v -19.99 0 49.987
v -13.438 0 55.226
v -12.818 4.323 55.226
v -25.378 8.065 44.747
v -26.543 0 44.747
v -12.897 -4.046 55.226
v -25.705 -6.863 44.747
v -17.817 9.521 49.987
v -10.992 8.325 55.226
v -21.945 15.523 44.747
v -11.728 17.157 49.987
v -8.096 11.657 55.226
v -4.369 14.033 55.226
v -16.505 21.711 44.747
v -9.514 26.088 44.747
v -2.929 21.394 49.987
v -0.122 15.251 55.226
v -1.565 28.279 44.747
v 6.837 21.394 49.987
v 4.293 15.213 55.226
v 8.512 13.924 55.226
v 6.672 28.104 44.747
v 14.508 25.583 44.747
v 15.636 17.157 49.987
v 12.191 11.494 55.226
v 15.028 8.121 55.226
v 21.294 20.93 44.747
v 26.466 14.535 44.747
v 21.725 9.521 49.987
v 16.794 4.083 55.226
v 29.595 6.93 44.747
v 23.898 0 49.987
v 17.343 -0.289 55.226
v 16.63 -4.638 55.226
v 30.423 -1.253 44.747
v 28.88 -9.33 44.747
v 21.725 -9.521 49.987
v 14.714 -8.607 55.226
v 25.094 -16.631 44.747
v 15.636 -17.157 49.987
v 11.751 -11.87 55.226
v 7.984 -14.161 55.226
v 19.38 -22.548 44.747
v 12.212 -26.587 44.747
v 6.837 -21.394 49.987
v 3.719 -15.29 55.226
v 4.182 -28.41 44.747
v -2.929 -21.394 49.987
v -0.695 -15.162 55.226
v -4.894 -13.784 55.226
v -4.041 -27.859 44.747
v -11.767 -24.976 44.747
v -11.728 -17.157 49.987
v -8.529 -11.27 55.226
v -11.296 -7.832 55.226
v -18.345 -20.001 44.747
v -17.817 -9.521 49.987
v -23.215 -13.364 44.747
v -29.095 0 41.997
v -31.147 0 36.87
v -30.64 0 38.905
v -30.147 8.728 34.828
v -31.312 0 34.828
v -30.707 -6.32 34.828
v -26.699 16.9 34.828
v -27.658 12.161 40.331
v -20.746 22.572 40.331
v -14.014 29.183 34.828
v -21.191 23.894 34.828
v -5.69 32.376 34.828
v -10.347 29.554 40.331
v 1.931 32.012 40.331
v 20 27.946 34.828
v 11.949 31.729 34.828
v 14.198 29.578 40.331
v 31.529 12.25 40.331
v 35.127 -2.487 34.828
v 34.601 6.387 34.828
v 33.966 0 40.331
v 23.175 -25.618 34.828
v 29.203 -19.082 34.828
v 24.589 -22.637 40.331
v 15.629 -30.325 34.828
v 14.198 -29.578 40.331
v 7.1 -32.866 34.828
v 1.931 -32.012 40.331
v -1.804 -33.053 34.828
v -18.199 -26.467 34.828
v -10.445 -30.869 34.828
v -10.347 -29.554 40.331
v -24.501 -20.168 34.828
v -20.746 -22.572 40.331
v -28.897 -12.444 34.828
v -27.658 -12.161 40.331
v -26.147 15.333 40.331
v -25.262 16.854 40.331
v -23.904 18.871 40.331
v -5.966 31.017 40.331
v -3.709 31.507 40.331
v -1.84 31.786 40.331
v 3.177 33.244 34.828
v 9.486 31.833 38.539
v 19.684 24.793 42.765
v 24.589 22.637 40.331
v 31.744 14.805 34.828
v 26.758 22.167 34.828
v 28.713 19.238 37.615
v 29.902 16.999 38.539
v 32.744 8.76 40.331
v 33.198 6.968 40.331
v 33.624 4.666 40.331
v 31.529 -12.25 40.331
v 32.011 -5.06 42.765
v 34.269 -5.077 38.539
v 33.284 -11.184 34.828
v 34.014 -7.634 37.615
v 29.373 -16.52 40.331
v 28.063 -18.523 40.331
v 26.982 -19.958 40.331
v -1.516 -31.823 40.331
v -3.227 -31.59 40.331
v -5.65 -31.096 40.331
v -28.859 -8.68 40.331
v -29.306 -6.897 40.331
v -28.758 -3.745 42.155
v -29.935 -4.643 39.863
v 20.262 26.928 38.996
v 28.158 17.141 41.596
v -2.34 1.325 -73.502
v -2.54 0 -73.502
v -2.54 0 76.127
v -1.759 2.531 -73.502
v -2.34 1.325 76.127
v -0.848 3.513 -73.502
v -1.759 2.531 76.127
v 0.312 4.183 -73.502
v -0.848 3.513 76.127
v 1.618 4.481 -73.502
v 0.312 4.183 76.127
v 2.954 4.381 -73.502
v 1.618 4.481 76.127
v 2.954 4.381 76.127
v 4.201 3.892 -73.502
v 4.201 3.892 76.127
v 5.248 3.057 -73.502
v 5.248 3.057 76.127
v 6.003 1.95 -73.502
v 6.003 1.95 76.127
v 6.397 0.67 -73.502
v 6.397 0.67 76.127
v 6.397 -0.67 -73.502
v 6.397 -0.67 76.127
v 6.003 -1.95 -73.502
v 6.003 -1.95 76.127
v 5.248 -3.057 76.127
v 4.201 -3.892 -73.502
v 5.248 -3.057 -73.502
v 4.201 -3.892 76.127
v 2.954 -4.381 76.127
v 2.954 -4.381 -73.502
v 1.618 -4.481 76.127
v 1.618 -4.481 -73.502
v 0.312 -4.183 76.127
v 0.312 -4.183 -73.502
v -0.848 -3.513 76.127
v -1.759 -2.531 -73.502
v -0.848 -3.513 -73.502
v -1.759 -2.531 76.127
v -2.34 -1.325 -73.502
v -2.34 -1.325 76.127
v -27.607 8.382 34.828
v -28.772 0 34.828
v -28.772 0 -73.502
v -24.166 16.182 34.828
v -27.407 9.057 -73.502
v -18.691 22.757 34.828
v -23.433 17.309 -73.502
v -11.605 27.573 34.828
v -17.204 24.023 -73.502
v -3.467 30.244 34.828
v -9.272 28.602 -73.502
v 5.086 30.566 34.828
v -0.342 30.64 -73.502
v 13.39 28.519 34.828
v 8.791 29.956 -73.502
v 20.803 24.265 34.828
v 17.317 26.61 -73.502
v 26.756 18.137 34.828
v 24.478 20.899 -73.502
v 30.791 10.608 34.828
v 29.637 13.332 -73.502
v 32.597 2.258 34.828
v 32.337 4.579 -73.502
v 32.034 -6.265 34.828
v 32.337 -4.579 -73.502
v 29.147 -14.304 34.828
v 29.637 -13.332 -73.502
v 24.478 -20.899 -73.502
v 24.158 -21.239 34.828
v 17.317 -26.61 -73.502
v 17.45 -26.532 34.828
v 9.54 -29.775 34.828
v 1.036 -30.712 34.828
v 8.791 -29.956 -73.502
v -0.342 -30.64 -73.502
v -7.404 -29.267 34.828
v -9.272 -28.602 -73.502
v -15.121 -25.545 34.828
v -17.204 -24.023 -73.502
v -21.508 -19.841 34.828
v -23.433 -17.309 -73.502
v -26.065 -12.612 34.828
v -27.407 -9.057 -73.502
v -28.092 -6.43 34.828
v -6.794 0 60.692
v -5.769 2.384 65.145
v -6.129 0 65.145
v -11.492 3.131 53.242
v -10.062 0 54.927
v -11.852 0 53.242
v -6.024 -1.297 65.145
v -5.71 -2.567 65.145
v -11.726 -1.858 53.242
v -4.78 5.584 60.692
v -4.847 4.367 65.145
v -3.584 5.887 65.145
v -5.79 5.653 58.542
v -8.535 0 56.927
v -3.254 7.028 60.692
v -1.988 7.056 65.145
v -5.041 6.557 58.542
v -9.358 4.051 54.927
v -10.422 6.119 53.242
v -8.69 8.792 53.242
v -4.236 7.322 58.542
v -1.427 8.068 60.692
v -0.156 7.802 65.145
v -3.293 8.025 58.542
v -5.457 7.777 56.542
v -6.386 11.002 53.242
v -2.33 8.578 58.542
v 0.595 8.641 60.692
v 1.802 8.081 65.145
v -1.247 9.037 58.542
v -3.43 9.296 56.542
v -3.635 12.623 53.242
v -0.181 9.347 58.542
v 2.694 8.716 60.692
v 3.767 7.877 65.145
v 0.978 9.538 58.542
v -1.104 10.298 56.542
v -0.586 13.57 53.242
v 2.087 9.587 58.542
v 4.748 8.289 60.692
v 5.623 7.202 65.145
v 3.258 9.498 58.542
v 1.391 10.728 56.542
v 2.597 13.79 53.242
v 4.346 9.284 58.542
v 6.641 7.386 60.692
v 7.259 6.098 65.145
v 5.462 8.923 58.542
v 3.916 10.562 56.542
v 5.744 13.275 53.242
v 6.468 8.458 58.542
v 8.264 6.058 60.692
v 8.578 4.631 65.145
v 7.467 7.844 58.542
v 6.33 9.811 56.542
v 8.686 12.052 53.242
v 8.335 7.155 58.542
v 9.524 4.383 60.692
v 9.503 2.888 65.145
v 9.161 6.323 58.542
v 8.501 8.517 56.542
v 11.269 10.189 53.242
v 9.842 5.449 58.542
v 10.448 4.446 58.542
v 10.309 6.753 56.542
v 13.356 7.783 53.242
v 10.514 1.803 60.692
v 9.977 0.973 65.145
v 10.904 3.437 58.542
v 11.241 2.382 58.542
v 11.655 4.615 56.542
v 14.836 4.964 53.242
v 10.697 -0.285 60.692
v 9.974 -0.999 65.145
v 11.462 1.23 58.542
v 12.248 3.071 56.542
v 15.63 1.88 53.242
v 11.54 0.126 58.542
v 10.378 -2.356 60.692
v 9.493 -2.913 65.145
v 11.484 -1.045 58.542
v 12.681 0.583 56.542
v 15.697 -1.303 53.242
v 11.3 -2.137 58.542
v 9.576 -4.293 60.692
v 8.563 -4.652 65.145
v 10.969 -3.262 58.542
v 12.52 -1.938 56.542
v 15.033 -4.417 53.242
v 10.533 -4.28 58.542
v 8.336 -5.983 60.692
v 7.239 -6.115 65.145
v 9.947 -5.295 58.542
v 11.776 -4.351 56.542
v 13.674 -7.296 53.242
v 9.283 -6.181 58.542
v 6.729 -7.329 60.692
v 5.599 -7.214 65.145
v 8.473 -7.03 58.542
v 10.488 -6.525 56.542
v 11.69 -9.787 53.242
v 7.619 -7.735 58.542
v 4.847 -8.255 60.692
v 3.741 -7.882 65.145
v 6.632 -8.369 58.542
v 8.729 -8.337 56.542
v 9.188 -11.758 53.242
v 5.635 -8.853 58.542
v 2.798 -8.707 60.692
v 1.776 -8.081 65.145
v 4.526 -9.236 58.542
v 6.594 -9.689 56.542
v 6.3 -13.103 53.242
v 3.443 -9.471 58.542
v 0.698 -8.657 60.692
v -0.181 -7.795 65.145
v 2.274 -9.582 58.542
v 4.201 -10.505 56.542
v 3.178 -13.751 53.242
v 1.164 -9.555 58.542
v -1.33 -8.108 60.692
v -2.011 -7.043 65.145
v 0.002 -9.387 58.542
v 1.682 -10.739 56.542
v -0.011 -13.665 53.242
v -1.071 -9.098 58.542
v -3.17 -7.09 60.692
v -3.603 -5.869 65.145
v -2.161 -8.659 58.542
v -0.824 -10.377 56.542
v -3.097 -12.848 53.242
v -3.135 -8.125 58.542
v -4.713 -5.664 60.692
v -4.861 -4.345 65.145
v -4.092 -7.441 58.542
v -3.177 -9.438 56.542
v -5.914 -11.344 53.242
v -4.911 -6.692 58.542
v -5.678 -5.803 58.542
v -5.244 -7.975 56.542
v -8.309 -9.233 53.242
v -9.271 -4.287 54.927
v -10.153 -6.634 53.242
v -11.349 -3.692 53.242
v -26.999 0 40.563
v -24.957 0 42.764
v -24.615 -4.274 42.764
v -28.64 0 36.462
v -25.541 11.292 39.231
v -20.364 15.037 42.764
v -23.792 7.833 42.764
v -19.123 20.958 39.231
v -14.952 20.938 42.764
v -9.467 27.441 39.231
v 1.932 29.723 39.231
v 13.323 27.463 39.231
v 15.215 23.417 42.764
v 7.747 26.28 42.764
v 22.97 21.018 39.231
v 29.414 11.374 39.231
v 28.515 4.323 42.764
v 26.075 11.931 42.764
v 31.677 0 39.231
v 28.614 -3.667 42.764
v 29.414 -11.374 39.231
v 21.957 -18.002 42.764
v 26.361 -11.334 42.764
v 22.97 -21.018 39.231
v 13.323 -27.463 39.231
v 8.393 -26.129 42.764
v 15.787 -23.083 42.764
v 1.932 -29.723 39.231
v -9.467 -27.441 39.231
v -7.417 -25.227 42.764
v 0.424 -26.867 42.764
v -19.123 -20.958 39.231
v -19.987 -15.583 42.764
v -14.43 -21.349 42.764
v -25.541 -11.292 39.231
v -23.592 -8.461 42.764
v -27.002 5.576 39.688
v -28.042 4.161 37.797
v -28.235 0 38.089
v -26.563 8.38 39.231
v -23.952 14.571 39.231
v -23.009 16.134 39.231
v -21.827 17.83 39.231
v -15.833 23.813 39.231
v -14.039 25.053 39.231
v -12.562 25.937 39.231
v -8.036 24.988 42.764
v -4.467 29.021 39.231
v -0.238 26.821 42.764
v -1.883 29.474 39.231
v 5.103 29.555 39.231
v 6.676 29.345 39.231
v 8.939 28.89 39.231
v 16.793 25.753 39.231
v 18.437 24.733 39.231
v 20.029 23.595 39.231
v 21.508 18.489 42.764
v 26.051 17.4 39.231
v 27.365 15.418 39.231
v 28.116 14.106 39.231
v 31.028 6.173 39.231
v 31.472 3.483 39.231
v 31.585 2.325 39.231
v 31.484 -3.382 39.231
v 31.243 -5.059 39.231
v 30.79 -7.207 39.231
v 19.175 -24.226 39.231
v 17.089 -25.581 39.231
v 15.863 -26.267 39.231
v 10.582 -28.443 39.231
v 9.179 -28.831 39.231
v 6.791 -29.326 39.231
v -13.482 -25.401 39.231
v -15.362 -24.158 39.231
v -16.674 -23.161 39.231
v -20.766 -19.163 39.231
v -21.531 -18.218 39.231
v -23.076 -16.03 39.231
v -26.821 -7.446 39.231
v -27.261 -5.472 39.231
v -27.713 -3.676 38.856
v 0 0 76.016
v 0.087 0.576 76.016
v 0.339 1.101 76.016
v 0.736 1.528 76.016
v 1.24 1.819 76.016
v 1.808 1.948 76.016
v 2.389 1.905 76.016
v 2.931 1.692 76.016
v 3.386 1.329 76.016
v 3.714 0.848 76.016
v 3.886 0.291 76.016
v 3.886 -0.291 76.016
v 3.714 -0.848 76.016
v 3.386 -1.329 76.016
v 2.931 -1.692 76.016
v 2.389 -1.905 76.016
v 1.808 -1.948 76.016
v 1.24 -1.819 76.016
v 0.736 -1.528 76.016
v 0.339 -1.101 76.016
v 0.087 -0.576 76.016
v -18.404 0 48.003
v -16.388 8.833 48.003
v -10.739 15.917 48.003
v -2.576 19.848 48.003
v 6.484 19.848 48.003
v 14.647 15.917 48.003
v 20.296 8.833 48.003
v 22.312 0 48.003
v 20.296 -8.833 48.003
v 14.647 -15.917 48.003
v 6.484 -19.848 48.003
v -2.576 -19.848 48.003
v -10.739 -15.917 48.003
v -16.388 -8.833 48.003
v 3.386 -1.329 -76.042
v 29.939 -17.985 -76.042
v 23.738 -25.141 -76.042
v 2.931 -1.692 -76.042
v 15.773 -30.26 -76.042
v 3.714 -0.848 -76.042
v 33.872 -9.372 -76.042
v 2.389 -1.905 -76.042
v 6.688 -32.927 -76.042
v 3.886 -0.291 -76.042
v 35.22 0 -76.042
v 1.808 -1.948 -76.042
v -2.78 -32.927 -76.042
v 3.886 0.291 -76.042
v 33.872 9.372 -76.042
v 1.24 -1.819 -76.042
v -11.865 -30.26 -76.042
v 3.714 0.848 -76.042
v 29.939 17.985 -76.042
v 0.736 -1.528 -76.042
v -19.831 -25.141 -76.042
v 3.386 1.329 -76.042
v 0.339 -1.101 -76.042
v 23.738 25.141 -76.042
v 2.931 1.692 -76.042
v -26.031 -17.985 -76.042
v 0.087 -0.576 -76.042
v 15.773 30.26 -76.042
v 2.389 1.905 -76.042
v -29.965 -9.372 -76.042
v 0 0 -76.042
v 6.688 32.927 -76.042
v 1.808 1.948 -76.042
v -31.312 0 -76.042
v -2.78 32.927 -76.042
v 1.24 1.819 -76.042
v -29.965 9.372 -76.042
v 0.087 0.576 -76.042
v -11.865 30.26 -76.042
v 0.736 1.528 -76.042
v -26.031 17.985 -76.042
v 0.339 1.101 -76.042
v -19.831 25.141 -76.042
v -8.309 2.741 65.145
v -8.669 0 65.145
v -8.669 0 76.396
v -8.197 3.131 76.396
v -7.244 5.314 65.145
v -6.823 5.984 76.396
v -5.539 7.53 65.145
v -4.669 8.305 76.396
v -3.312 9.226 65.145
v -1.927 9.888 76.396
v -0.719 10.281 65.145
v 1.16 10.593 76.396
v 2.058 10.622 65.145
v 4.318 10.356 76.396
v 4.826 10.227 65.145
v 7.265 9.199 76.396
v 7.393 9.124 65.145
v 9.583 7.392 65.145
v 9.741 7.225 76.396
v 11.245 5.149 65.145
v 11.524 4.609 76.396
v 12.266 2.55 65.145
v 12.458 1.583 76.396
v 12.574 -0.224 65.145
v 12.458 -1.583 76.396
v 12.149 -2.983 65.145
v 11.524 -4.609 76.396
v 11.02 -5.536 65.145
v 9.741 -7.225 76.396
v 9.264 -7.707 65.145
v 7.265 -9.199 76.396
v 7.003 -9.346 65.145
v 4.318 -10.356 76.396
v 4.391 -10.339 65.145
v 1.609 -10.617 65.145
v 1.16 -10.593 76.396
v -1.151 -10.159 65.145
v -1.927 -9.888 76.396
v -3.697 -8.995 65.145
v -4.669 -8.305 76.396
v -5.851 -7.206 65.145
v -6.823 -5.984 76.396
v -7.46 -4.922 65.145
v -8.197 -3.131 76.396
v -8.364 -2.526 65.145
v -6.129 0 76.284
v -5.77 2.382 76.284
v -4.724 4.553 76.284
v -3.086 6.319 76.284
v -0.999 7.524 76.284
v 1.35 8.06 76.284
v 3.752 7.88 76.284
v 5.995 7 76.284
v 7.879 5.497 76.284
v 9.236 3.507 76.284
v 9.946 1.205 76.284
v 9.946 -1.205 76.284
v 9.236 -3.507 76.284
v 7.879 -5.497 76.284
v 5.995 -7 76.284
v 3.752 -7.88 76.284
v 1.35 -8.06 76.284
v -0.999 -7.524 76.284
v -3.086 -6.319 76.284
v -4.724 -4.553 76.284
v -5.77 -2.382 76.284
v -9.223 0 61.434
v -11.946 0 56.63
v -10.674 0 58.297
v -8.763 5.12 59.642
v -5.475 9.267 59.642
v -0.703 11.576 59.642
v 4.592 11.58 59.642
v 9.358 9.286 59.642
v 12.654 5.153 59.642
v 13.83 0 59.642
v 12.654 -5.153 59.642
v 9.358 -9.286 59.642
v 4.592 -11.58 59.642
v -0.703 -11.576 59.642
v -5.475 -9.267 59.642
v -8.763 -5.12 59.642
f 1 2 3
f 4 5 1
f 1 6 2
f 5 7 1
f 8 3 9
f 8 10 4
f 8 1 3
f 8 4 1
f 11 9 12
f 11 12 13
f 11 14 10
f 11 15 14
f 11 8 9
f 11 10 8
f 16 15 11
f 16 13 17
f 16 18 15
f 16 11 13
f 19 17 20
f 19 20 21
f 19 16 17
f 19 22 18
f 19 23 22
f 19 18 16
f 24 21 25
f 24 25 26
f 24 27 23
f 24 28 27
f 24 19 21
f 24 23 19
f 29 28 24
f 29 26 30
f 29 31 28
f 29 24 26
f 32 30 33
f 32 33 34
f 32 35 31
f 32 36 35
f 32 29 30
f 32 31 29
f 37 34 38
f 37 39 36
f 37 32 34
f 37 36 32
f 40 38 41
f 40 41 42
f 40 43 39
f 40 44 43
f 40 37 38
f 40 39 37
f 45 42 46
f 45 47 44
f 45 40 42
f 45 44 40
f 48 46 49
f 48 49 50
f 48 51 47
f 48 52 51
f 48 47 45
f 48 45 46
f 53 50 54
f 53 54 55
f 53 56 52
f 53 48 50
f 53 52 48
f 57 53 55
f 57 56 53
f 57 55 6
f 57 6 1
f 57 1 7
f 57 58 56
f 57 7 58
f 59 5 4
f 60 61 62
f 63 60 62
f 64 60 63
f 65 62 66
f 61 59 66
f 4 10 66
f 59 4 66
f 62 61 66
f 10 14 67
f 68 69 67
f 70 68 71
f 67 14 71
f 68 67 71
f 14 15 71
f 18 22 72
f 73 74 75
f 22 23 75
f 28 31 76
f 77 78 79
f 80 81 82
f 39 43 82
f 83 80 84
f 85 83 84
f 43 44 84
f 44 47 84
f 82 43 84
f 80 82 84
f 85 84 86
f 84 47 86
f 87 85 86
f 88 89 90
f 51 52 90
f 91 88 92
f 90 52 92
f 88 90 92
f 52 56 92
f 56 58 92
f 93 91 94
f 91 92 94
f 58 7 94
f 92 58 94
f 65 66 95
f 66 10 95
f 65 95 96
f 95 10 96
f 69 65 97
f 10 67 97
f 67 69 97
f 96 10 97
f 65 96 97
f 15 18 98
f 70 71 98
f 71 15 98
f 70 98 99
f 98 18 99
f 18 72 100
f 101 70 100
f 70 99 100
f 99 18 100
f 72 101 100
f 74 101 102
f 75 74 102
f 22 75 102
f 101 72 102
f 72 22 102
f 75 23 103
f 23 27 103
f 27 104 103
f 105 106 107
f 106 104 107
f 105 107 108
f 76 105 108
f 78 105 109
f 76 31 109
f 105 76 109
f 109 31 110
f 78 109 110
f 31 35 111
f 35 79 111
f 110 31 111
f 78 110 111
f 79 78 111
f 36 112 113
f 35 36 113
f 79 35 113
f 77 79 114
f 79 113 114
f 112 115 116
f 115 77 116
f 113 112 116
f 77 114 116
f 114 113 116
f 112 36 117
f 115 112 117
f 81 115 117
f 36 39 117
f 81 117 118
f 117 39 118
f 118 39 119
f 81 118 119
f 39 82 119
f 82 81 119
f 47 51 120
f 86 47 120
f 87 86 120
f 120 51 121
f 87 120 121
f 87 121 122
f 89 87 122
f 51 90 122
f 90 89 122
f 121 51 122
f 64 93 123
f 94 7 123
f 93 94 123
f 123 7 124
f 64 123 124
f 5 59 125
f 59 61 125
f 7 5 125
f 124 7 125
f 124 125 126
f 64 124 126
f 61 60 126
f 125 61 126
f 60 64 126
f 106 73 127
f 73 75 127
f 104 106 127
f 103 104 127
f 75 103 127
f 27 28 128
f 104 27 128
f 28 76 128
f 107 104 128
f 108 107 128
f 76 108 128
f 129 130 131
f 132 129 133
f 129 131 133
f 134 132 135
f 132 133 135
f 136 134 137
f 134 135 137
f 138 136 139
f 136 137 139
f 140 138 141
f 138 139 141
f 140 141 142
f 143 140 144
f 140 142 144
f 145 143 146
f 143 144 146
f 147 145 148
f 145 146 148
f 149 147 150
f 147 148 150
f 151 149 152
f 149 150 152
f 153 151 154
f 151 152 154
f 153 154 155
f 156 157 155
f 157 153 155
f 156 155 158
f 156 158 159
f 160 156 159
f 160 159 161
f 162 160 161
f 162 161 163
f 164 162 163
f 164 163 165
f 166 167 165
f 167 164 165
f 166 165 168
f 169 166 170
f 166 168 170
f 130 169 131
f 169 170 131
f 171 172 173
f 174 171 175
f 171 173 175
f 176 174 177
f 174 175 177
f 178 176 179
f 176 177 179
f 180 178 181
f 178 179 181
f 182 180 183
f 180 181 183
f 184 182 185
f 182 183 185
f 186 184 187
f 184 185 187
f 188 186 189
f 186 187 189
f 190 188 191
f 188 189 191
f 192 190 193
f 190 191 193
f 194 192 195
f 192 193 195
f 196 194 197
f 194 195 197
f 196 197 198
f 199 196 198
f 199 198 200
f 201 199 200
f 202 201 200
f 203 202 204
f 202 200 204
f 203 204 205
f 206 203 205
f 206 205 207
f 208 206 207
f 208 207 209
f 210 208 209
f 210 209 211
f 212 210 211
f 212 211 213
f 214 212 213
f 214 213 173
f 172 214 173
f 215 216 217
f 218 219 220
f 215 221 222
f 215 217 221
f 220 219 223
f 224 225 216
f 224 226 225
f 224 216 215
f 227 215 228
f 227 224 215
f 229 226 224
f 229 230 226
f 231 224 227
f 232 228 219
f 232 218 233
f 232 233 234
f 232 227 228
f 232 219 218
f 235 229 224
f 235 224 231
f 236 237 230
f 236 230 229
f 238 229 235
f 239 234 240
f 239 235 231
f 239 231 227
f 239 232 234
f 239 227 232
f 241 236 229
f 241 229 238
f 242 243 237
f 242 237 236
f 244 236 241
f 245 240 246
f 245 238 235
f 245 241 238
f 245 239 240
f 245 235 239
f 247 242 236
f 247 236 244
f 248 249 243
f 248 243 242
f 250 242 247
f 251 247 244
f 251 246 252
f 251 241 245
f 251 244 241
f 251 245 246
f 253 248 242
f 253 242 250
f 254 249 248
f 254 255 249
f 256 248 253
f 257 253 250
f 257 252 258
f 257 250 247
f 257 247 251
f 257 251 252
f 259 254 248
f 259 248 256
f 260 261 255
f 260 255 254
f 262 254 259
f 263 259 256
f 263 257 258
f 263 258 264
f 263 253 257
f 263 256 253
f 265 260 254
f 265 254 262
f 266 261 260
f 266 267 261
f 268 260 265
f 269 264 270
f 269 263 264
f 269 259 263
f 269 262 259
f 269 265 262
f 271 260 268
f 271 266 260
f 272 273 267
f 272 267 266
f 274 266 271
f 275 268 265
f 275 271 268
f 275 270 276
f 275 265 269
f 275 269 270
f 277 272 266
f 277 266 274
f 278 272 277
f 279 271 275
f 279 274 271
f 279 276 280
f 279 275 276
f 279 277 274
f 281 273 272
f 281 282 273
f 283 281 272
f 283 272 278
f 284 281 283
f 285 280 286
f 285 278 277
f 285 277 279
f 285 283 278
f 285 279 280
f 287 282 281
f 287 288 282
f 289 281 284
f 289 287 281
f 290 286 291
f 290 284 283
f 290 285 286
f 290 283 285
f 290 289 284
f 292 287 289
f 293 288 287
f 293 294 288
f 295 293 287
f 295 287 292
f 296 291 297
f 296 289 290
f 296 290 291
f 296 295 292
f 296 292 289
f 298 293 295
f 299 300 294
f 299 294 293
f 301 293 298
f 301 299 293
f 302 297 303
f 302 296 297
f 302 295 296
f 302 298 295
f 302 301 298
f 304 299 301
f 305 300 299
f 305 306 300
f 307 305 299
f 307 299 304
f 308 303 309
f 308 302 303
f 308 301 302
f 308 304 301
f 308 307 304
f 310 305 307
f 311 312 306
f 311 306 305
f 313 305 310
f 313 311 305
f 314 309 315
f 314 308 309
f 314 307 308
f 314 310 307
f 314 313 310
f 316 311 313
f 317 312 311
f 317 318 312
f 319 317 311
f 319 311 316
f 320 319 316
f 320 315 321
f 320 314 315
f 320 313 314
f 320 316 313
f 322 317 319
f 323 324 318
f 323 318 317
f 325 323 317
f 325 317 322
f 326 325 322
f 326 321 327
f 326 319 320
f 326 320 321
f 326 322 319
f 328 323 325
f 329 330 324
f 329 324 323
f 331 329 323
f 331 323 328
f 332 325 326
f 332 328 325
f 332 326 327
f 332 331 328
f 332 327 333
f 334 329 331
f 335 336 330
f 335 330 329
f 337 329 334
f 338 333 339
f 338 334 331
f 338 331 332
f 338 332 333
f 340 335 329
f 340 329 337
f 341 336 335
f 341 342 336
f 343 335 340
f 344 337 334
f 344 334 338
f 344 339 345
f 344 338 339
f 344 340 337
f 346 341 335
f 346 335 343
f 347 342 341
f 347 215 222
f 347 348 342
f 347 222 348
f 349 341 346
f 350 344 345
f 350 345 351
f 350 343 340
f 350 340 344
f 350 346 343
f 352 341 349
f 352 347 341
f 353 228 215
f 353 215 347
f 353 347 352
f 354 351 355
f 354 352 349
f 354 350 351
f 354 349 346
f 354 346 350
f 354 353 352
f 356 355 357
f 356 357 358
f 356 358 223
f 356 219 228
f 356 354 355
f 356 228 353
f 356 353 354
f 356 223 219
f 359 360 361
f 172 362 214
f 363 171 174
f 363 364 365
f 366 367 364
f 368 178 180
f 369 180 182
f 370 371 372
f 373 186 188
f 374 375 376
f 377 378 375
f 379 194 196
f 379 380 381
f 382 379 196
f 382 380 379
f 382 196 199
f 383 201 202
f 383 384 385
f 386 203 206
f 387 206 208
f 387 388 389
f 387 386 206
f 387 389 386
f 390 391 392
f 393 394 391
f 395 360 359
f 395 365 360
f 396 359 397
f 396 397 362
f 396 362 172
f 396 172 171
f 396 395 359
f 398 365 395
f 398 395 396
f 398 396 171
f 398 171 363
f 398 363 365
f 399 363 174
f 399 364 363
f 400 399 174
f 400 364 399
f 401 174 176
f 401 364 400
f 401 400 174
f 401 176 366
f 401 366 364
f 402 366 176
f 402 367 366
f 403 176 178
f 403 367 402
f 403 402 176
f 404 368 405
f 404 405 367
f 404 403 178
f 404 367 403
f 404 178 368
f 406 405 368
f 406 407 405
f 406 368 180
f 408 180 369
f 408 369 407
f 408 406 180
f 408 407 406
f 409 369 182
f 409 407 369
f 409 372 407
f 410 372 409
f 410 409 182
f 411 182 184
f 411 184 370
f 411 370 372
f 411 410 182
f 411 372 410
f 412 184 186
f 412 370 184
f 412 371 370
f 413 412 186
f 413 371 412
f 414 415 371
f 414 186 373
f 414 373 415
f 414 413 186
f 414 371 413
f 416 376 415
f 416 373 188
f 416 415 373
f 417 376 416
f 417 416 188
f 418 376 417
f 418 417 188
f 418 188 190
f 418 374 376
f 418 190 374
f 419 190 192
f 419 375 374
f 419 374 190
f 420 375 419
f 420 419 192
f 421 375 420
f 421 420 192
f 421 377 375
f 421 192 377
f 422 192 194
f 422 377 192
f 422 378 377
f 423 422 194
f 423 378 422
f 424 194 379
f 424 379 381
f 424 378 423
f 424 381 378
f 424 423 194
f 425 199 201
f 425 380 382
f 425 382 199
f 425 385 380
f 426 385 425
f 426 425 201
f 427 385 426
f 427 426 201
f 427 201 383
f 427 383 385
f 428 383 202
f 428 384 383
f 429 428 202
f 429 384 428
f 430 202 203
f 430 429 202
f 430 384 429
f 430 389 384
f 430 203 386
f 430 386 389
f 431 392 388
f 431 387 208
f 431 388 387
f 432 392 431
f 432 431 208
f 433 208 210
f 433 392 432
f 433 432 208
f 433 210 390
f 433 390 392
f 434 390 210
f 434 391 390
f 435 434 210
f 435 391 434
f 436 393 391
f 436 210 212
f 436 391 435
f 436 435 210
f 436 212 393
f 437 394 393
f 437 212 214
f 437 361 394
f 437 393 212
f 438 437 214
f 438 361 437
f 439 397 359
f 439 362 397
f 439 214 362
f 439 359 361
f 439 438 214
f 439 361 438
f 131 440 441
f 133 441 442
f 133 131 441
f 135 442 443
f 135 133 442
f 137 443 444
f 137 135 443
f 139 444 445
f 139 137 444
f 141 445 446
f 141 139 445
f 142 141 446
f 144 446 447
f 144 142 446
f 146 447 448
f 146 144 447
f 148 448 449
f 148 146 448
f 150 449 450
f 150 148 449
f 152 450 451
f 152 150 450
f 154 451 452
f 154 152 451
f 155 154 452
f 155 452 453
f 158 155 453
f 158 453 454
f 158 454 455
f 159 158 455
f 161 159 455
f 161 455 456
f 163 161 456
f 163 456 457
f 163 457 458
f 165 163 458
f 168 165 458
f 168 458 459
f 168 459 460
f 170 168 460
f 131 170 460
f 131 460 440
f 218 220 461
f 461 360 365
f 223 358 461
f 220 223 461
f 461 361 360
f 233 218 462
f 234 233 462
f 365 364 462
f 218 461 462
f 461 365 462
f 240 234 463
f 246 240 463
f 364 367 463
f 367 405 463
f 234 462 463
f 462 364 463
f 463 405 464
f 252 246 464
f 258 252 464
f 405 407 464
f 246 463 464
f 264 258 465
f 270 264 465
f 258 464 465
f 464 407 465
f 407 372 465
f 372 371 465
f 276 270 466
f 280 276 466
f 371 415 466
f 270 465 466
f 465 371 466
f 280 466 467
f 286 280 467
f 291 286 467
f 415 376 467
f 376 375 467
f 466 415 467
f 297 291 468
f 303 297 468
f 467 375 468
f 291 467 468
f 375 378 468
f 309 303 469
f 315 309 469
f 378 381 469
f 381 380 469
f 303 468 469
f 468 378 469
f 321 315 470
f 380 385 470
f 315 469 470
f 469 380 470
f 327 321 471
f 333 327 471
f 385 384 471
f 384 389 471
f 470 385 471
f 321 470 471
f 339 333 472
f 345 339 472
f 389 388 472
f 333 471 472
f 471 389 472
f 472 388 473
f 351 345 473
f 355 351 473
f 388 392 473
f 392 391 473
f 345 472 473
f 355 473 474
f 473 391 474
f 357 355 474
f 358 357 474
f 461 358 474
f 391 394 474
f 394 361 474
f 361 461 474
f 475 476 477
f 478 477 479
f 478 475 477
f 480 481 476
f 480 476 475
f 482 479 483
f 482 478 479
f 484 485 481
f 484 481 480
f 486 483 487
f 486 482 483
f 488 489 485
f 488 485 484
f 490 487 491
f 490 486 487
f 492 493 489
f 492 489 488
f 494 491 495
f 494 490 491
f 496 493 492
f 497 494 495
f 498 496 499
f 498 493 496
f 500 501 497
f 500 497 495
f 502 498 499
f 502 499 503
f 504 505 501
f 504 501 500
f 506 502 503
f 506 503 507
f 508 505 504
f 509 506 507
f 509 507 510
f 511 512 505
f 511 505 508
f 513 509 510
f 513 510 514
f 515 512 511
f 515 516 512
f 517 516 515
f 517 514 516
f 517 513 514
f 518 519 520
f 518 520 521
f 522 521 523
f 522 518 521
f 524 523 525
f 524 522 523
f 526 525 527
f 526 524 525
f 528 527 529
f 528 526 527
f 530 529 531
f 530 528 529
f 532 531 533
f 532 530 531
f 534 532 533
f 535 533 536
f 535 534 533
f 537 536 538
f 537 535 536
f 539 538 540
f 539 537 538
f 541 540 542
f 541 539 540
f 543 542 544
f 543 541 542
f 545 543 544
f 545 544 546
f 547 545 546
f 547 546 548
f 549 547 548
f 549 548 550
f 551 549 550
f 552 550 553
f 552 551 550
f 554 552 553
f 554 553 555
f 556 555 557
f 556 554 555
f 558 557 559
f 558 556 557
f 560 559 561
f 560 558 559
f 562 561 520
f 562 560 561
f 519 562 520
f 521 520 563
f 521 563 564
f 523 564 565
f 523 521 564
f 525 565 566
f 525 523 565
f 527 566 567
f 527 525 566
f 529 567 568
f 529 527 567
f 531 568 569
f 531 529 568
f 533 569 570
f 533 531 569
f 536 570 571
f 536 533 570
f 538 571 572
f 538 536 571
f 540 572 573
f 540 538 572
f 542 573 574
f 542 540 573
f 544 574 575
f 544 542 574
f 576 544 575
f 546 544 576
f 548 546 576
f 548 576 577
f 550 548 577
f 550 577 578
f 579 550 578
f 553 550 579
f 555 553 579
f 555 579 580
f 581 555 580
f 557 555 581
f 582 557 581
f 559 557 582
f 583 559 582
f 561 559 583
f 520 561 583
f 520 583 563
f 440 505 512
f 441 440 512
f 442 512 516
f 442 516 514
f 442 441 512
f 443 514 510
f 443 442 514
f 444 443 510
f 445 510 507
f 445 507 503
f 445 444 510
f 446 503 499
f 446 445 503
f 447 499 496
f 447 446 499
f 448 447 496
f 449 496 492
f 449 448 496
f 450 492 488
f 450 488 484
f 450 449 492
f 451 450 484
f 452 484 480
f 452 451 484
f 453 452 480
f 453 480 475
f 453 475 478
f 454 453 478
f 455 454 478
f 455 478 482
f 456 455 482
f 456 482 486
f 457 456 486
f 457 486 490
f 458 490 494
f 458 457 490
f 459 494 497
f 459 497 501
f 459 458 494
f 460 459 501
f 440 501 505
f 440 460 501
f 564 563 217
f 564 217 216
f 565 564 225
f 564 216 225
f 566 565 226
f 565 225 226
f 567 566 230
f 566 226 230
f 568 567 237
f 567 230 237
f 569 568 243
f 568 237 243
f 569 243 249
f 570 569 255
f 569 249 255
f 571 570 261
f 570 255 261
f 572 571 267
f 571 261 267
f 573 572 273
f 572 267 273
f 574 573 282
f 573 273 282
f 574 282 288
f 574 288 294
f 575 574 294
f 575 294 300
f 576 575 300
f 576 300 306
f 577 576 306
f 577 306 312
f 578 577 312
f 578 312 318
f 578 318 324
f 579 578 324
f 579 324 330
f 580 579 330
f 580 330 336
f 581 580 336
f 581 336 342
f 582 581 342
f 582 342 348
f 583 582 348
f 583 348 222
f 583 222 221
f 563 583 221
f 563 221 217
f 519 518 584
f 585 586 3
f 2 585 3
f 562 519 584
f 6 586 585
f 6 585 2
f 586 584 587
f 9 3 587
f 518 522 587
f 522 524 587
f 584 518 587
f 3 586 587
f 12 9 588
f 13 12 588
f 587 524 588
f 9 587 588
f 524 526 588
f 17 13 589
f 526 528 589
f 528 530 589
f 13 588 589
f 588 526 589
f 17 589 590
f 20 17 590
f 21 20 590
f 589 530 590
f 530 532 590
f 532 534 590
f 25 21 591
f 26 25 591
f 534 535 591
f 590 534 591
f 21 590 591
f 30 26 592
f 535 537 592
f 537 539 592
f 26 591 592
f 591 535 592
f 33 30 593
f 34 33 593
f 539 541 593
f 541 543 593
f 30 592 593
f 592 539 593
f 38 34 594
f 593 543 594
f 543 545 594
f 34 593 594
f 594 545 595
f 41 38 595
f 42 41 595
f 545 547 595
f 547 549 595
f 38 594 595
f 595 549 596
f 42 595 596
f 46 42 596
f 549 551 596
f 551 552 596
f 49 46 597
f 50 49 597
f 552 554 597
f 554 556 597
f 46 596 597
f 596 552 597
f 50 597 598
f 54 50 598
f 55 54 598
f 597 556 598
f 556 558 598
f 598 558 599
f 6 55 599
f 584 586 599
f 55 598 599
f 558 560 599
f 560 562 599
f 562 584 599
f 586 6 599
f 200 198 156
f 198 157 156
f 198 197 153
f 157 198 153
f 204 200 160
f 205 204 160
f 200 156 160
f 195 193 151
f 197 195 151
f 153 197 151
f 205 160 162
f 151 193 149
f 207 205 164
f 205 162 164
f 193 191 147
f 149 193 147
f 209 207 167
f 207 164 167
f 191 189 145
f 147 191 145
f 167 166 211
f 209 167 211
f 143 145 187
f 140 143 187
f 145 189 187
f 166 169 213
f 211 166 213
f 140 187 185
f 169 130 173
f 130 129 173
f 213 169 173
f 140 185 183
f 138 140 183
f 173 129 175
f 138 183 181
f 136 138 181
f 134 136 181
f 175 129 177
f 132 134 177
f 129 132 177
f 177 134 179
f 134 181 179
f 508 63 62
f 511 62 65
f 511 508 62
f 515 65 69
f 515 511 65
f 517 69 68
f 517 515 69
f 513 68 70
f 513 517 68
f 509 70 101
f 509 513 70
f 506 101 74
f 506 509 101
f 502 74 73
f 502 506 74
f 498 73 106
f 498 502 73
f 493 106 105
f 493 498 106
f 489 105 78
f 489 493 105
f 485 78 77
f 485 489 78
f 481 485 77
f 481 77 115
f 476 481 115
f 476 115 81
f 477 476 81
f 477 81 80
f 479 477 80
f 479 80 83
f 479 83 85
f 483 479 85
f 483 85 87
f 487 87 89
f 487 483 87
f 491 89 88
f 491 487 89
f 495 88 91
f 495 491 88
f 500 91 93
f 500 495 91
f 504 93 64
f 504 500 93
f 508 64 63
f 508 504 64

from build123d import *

# Parameters (mm, degrees)
F3_R = 12.7
F4_T = -2.54


with BuildPart() as f2:
    # F0 (on Front) → F2 (revolve)
    with BuildSketch(Plane.XZ):
        Polygon((0, -76.0418921709), (0, 76.0156810284), (-8.6687002331, 76.3955637813), (-8.6687002331, 59.0391717851), (-31.3122980297, 40.9342460334), (-31.3122980297, -76.0418921709), align=None)
    revolve(axis=Axis((1.9537888002, 0, -0.1578219235), (0, 0, -1)))

    # F3
    f3_edges = [f2.edges().sort_by_distance(p)[0] for p in [
        (35.219876, 0, 40.934246),
        (12.576278, 0, 59.039172),
    ]]
    fillet(f3_edges, radius=F3_R)

    # F4
    f4_openings = [f2.faces().sort_by_distance(p)[0] for p in [
        (8.241928, 0, 76.205622),
    ]]
    offset(amount=F4_T, openings=f4_openings)


solid = f2.part
